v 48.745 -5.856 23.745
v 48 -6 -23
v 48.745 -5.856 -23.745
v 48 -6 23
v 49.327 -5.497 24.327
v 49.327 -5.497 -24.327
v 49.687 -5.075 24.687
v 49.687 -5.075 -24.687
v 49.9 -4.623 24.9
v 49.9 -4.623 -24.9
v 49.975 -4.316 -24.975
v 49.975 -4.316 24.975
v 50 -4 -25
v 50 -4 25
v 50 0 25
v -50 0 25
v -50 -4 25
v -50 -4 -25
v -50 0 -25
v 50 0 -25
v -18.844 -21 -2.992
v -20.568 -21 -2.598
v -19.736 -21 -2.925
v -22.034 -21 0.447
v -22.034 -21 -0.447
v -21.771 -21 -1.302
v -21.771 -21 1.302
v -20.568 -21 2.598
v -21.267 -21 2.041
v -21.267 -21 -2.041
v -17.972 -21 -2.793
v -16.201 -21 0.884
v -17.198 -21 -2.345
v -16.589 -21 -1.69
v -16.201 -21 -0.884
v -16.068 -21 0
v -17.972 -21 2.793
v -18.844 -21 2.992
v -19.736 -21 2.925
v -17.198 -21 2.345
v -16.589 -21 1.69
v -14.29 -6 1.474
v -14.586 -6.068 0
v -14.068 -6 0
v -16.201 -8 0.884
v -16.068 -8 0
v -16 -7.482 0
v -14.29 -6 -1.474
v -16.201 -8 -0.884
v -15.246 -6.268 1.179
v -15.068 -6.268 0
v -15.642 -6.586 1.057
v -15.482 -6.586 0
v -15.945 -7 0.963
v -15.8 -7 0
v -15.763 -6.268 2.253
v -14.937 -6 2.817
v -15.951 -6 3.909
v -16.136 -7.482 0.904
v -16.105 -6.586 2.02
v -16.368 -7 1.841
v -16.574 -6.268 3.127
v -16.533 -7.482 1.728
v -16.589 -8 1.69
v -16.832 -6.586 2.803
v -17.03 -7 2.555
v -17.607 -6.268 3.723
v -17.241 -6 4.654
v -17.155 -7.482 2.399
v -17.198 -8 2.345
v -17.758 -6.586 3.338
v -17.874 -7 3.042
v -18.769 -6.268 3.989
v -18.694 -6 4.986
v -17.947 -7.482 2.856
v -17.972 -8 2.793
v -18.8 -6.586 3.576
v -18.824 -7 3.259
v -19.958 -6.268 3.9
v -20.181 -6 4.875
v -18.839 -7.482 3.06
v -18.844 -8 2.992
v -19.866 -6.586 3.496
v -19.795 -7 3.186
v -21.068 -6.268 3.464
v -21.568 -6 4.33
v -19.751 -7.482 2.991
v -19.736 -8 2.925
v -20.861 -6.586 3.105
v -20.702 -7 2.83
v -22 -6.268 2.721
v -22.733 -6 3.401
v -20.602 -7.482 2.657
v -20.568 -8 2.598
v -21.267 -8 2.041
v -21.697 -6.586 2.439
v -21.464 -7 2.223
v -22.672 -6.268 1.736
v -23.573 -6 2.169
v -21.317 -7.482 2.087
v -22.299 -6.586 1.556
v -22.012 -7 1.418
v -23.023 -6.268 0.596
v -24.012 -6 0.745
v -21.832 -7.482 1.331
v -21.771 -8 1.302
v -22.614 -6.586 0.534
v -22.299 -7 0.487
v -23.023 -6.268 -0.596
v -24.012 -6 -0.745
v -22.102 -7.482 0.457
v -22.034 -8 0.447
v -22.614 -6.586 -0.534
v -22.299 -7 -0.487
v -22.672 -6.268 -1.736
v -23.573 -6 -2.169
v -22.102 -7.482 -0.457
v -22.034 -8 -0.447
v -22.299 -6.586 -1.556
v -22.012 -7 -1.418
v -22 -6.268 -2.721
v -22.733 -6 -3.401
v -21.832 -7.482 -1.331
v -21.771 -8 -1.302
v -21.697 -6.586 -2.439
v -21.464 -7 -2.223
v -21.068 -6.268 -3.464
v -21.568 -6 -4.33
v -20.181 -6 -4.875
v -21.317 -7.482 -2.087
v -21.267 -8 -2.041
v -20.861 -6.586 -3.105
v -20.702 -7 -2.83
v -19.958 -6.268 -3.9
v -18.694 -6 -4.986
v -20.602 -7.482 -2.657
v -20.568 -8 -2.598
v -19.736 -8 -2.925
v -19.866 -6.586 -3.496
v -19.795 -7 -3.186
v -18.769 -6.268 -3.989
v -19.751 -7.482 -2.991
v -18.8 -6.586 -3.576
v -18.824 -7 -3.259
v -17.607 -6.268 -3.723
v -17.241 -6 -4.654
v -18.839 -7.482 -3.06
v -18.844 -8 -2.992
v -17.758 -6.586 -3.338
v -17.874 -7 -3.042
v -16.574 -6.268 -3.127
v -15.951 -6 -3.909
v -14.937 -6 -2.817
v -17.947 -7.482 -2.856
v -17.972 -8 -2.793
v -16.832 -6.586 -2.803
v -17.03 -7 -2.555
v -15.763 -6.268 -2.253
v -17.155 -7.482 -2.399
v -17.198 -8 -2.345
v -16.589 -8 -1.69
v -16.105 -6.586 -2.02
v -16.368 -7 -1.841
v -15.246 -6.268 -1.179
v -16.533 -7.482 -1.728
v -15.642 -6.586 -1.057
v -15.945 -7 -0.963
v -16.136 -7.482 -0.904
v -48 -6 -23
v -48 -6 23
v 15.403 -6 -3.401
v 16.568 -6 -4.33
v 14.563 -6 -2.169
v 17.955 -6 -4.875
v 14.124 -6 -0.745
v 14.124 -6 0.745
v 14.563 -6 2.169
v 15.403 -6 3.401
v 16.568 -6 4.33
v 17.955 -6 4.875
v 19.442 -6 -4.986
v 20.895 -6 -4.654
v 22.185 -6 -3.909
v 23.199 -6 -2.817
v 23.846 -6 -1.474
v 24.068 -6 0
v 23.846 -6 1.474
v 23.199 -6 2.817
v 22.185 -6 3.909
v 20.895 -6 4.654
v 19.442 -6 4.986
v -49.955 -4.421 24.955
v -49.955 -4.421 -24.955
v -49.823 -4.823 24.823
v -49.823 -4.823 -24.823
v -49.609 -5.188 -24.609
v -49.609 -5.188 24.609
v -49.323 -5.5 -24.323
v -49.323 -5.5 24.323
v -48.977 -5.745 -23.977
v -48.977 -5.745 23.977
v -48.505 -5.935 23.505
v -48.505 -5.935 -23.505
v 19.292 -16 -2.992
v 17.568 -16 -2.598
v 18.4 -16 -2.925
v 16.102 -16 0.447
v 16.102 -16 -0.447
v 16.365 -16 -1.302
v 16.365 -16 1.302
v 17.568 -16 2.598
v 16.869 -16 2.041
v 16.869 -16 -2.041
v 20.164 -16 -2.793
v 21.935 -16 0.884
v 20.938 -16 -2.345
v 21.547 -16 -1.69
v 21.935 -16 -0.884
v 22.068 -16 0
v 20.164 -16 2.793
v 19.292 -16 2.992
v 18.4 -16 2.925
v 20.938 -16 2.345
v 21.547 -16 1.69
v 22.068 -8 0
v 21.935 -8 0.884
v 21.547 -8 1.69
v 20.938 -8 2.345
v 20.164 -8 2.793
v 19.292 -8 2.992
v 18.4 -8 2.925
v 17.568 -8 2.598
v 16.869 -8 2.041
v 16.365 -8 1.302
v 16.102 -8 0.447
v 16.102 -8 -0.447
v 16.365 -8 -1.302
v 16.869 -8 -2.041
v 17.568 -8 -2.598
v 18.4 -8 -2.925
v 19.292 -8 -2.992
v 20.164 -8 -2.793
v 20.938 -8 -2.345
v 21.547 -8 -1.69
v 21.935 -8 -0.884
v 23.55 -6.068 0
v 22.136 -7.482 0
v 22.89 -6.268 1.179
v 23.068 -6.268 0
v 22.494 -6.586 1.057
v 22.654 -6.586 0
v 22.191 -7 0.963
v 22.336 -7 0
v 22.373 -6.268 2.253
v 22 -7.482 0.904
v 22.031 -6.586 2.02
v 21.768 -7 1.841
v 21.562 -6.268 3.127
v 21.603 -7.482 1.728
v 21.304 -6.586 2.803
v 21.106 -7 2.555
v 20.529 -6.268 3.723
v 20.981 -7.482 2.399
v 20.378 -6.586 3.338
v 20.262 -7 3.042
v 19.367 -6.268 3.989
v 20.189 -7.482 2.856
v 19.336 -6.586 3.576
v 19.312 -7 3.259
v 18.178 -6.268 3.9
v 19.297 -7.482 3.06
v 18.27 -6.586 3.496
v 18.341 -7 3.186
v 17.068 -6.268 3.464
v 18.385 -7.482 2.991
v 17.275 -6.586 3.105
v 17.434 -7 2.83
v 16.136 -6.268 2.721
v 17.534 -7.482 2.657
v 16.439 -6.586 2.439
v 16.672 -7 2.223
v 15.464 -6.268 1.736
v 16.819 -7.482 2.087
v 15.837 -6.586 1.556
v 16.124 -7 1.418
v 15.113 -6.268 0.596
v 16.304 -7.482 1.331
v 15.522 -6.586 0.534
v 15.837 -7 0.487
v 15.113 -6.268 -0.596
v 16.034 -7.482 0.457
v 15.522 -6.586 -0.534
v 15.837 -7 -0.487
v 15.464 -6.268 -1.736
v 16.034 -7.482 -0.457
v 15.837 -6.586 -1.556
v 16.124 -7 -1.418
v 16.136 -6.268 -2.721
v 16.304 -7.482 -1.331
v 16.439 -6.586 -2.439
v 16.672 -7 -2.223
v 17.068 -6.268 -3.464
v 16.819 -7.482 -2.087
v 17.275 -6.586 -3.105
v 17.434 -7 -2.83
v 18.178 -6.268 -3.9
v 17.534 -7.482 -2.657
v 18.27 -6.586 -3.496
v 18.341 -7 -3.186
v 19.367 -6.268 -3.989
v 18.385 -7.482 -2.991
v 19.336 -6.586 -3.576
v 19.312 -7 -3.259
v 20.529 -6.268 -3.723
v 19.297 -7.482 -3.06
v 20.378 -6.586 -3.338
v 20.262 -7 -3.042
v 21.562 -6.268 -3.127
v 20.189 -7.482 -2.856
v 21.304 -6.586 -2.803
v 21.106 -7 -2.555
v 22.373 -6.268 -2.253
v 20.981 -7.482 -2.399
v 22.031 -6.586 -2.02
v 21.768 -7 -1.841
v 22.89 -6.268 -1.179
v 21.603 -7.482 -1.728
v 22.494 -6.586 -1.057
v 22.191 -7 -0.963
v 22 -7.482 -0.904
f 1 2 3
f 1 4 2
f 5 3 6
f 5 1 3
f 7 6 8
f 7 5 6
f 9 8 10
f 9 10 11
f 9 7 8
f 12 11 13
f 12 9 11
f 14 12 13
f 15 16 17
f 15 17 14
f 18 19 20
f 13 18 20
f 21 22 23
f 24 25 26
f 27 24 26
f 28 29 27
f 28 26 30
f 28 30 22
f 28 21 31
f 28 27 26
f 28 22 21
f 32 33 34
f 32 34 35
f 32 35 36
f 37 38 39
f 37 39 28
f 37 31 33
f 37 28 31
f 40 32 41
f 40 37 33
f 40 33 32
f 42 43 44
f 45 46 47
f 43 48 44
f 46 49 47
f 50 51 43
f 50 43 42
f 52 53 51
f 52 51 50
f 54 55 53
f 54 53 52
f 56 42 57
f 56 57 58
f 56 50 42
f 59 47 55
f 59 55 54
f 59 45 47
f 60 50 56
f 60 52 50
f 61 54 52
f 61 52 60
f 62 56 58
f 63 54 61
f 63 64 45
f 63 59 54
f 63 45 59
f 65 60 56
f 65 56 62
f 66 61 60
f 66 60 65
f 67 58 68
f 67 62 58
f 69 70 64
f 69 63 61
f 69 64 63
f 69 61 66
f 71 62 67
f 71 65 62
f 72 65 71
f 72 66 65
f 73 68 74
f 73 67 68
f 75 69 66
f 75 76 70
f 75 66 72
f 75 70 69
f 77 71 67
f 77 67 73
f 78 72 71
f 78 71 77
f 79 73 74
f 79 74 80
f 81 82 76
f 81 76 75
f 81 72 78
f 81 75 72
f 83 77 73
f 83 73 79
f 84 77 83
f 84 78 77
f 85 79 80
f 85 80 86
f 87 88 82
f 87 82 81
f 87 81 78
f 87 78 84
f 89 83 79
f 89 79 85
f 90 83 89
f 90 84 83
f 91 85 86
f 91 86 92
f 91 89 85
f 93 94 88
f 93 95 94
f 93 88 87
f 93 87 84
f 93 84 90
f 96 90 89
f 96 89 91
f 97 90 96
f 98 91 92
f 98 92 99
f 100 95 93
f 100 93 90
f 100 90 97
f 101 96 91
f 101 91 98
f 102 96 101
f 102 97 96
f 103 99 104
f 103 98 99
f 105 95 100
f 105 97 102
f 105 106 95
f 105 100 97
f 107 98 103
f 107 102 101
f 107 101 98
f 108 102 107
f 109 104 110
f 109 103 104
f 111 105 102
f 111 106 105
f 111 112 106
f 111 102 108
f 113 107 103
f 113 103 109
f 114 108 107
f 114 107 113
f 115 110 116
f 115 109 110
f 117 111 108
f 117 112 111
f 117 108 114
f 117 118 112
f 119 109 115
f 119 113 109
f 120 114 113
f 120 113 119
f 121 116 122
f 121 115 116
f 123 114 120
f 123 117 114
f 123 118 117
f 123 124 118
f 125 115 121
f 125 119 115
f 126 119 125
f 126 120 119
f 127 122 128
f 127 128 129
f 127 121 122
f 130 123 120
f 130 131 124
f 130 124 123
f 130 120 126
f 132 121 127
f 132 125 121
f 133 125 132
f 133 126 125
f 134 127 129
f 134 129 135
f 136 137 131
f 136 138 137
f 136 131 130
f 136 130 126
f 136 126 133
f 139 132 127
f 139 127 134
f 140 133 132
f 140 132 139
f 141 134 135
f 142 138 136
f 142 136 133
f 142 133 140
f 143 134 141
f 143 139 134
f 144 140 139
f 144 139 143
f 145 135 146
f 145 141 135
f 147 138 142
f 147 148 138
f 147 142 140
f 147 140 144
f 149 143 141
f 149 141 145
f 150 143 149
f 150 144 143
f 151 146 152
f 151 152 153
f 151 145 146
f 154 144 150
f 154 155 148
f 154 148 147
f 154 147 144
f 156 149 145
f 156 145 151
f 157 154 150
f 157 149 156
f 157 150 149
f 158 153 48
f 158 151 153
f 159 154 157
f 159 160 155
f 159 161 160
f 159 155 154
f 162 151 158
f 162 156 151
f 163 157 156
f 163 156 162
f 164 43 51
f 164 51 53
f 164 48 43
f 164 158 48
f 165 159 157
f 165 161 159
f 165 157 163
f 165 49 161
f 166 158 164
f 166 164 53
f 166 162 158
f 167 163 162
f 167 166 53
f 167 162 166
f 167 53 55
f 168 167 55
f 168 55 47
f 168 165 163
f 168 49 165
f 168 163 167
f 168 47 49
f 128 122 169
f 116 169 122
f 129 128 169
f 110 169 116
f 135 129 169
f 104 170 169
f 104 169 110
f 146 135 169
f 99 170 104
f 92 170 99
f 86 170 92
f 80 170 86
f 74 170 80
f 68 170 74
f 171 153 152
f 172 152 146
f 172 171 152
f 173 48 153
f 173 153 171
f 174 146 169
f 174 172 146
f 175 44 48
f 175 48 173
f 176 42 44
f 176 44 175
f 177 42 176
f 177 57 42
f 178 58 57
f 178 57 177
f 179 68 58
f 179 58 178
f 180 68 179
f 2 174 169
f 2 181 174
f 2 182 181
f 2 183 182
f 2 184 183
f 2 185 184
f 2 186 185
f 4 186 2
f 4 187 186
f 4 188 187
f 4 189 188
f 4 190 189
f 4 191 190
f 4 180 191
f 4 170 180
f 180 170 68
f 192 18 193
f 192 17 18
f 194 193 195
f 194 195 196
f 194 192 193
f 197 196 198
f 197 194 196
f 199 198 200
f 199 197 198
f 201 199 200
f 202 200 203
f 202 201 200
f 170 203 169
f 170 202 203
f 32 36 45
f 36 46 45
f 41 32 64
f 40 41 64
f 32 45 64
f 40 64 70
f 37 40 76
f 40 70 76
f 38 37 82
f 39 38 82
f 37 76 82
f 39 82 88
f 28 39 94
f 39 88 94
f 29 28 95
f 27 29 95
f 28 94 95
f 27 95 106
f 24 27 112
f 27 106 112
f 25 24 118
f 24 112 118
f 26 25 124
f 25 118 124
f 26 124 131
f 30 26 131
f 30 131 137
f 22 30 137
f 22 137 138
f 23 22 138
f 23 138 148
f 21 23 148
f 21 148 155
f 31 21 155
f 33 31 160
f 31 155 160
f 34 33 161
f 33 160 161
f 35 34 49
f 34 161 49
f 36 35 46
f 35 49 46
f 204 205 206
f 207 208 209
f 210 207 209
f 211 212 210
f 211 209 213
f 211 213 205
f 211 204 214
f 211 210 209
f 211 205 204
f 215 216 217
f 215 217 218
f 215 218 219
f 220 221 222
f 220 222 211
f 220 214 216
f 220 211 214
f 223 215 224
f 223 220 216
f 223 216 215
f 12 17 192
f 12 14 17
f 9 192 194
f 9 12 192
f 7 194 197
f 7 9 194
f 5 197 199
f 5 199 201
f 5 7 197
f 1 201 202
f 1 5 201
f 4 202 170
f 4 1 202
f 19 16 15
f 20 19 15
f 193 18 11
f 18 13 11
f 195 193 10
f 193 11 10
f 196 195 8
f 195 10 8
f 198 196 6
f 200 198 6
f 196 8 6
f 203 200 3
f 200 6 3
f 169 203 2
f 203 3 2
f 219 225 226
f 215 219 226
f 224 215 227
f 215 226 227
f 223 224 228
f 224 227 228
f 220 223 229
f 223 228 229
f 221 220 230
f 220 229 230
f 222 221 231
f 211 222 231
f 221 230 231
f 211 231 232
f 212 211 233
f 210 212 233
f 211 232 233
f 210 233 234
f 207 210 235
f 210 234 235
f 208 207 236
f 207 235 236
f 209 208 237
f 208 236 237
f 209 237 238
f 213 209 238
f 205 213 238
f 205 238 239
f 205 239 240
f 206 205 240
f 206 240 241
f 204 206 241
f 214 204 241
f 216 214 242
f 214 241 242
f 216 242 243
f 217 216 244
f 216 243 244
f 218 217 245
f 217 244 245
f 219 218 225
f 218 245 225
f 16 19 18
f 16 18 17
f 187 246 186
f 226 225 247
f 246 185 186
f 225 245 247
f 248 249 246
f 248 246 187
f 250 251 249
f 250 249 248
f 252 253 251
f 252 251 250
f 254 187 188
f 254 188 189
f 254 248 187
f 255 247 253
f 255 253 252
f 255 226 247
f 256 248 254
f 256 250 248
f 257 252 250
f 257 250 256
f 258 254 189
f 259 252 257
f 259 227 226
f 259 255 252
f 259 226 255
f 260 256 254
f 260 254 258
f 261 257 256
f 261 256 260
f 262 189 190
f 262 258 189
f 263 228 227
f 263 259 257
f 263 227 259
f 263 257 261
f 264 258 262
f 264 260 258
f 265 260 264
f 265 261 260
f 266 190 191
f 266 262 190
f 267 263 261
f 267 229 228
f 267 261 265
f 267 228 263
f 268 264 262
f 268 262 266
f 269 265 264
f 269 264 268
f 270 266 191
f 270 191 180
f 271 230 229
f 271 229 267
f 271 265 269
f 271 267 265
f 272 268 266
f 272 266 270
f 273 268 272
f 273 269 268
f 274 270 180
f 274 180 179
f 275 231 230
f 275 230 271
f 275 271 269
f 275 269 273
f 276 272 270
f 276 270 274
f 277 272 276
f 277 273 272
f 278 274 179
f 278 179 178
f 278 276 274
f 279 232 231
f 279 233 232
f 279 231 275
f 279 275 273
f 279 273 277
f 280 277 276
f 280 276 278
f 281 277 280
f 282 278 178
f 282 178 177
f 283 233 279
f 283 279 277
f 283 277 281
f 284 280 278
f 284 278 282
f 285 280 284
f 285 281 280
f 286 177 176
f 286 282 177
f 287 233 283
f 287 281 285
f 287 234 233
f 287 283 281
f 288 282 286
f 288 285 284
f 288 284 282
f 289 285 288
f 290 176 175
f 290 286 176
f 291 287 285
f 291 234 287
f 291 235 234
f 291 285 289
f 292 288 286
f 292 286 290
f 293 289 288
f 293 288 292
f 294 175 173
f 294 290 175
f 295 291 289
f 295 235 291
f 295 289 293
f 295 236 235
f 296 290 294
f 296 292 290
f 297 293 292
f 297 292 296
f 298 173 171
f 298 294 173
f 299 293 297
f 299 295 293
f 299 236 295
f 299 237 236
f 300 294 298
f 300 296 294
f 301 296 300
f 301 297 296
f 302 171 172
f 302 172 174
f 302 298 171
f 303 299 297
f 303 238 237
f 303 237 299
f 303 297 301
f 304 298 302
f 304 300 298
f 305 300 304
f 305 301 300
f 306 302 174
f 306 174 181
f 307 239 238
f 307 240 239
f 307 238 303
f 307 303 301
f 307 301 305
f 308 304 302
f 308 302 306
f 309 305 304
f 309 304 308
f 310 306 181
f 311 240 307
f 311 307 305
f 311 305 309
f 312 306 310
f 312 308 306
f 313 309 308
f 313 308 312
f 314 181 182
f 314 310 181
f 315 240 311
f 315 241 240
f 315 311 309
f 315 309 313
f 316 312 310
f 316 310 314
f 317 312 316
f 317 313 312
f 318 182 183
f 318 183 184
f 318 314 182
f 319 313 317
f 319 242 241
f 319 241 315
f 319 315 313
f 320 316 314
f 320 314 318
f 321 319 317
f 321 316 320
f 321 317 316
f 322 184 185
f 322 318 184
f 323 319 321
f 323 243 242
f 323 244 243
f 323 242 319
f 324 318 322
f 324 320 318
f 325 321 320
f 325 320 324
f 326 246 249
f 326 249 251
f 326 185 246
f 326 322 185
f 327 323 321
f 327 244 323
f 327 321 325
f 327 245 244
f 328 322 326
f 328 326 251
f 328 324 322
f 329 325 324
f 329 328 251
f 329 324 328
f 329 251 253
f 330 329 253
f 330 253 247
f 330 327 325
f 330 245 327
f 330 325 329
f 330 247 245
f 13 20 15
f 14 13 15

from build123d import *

# Parameters (mm, degrees)
F0_W     = 100
F0_H     = 50
F1_DEPTH = 6
F2_R     = 3
F3_DEPTH = 10
F4_R     = 2
F5_R     = 3
F6_DEPTH = 5


with BuildPart() as f1:
    # F0 (on Front) → F1 (new body)
    with BuildSketch(Plane.XZ):
        Rectangle(F0_W, F0_H)
    extrude(amount=F1_DEPTH)

    # F2 (on face) → F3 (join)
    with BuildSketch(Plane.XZ.offset(6)):
        with Locations((-19.068, 0)):
            Circle(F2_R)
        with Locations((19.068, 0)):
            Circle(F2_R)
    extrude(amount=F3_DEPTH)

    # F4
    f4_edges = [f1.edges().sort_by_distance(p)[0] for p in [
        (50, -6, 0),
        (0, -6, -25),
        (0, -6, 25),
        (-50, -6, 0),
        (-22.068, -6, 0),
        (16.068, -6, 0),
    ]]
    fillet(f4_edges, radius=F4_R)

    # F5 (on face) → F6 (join)
    with BuildSketch(Plane.XZ.offset(16)):
        with Locations((-19.068, 0)):
            Circle(F5_R)
    extrude(amount=F6_DEPTH)


solid = f1.part
